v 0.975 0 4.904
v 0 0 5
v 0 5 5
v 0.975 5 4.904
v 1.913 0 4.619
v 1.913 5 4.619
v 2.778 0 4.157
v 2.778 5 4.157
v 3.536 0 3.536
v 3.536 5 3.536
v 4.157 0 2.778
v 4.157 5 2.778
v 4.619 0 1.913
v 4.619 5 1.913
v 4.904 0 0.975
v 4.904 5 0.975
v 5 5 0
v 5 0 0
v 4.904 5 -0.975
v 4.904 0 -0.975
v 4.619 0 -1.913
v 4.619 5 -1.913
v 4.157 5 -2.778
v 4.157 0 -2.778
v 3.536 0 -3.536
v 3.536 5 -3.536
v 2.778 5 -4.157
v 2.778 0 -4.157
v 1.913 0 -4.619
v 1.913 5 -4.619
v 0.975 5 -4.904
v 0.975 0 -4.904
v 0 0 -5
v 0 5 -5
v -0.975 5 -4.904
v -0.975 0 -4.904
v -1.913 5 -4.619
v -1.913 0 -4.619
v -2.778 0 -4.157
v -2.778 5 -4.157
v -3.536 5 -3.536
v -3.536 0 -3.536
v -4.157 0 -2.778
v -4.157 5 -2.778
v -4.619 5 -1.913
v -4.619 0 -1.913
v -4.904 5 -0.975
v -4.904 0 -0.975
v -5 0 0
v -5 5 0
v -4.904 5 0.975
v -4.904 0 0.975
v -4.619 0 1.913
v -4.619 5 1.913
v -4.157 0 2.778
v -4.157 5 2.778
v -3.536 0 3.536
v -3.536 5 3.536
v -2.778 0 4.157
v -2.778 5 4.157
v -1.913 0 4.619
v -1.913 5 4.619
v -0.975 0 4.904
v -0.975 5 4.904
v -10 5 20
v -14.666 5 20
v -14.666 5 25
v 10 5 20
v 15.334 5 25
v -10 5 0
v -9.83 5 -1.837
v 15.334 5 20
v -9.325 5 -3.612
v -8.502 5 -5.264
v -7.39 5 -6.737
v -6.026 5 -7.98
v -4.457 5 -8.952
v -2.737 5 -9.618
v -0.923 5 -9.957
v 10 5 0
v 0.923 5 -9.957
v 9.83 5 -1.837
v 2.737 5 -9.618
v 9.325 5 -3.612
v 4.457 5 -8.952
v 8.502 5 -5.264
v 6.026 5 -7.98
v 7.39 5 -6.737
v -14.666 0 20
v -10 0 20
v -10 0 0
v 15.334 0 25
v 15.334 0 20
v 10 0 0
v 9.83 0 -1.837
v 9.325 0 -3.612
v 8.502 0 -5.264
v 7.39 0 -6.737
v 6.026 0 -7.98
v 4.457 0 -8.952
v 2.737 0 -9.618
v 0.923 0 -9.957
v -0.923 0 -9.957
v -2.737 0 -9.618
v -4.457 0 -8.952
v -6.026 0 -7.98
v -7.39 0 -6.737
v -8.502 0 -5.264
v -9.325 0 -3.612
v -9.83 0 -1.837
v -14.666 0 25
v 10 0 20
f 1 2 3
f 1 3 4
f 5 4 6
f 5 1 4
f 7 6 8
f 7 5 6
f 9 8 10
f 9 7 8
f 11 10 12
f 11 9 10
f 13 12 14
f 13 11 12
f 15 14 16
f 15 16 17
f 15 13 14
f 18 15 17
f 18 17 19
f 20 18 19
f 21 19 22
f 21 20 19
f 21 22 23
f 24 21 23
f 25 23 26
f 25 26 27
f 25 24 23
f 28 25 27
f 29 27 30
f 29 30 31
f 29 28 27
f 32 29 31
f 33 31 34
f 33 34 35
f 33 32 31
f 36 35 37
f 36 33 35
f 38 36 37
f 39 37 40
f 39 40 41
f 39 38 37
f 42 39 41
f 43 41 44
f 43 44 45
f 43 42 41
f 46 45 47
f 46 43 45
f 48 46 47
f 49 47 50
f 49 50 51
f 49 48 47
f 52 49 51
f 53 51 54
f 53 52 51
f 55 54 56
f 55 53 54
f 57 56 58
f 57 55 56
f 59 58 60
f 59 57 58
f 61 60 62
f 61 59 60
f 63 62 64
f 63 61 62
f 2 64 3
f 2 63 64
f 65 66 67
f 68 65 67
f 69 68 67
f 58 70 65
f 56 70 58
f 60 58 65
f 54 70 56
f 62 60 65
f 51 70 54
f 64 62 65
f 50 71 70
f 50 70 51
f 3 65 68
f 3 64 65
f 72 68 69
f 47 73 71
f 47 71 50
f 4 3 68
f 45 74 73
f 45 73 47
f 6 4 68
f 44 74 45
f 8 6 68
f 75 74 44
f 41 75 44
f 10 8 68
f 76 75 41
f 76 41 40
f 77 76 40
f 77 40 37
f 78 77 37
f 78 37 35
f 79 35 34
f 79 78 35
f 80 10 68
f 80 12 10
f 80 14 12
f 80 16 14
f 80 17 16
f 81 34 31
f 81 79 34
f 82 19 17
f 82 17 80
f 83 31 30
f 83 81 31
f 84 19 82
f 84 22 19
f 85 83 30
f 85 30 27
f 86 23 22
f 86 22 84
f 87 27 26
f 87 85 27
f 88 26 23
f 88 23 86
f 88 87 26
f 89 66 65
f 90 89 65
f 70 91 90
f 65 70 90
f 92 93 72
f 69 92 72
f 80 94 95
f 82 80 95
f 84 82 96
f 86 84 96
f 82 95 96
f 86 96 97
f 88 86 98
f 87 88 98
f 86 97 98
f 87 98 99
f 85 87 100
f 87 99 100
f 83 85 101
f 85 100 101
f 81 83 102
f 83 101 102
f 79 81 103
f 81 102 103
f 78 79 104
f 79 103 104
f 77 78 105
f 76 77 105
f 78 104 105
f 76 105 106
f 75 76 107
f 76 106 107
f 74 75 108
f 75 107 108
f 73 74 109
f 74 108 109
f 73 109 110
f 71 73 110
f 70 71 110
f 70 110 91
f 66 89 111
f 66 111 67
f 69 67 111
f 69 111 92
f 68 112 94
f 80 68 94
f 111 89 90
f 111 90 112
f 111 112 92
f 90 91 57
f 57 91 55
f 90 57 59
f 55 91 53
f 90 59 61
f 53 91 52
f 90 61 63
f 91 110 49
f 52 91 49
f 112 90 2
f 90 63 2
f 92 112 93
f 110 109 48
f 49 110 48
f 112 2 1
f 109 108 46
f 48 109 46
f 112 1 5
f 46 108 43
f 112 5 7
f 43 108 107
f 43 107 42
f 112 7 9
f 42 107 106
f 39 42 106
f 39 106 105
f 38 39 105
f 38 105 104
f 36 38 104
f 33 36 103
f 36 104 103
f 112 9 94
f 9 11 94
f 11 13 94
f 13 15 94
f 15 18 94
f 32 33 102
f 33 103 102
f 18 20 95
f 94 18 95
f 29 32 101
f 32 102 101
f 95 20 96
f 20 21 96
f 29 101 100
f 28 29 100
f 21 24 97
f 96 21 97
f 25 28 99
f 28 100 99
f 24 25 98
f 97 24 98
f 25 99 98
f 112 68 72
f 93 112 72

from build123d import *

# Parameters (mm, degrees)
SKETCH2_R           = 5
BOSS_EXTRUDE1_DEPTH = 5
SKETCH3_W           = 30
SKETCH3_H           = 5
BOSS_EXTRUDE2_DEPTH = 5


with BuildPart() as part:
    # Sketch2 → Boss-Extrude1 (new body)
    with BuildSketch(Plane(origin=(0, 0, 0), x_dir=(1, 0, 0), z_dir=(0, 1, 0))):
        with BuildLine():
            Line((-10, 0), (-10, -20))
            Line((-10, -20), (10, -20))
            Line((10, -20), (10, 0))
            ThreePointArc((10, 0), (0, 10), (-10, 0))
        make_face()
        with Locations(Location((0, 0, 0), (0, 0, 270))):
            Circle(SKETCH2_R, mode=Mode.SUBTRACT)
    extrude(amount=BOSS_EXTRUDE1_DEPTH)

    # Sketch3 → Boss-Extrude2 (add)
    with BuildSketch(Plane.XY.offset(20)):
        with Locations((0.334158143, 2.5)):
            Rectangle(SKETCH3_W, SKETCH3_H)
    extrude(amount=BOSS_EXTRUDE2_DEPTH)


solid = part.part
